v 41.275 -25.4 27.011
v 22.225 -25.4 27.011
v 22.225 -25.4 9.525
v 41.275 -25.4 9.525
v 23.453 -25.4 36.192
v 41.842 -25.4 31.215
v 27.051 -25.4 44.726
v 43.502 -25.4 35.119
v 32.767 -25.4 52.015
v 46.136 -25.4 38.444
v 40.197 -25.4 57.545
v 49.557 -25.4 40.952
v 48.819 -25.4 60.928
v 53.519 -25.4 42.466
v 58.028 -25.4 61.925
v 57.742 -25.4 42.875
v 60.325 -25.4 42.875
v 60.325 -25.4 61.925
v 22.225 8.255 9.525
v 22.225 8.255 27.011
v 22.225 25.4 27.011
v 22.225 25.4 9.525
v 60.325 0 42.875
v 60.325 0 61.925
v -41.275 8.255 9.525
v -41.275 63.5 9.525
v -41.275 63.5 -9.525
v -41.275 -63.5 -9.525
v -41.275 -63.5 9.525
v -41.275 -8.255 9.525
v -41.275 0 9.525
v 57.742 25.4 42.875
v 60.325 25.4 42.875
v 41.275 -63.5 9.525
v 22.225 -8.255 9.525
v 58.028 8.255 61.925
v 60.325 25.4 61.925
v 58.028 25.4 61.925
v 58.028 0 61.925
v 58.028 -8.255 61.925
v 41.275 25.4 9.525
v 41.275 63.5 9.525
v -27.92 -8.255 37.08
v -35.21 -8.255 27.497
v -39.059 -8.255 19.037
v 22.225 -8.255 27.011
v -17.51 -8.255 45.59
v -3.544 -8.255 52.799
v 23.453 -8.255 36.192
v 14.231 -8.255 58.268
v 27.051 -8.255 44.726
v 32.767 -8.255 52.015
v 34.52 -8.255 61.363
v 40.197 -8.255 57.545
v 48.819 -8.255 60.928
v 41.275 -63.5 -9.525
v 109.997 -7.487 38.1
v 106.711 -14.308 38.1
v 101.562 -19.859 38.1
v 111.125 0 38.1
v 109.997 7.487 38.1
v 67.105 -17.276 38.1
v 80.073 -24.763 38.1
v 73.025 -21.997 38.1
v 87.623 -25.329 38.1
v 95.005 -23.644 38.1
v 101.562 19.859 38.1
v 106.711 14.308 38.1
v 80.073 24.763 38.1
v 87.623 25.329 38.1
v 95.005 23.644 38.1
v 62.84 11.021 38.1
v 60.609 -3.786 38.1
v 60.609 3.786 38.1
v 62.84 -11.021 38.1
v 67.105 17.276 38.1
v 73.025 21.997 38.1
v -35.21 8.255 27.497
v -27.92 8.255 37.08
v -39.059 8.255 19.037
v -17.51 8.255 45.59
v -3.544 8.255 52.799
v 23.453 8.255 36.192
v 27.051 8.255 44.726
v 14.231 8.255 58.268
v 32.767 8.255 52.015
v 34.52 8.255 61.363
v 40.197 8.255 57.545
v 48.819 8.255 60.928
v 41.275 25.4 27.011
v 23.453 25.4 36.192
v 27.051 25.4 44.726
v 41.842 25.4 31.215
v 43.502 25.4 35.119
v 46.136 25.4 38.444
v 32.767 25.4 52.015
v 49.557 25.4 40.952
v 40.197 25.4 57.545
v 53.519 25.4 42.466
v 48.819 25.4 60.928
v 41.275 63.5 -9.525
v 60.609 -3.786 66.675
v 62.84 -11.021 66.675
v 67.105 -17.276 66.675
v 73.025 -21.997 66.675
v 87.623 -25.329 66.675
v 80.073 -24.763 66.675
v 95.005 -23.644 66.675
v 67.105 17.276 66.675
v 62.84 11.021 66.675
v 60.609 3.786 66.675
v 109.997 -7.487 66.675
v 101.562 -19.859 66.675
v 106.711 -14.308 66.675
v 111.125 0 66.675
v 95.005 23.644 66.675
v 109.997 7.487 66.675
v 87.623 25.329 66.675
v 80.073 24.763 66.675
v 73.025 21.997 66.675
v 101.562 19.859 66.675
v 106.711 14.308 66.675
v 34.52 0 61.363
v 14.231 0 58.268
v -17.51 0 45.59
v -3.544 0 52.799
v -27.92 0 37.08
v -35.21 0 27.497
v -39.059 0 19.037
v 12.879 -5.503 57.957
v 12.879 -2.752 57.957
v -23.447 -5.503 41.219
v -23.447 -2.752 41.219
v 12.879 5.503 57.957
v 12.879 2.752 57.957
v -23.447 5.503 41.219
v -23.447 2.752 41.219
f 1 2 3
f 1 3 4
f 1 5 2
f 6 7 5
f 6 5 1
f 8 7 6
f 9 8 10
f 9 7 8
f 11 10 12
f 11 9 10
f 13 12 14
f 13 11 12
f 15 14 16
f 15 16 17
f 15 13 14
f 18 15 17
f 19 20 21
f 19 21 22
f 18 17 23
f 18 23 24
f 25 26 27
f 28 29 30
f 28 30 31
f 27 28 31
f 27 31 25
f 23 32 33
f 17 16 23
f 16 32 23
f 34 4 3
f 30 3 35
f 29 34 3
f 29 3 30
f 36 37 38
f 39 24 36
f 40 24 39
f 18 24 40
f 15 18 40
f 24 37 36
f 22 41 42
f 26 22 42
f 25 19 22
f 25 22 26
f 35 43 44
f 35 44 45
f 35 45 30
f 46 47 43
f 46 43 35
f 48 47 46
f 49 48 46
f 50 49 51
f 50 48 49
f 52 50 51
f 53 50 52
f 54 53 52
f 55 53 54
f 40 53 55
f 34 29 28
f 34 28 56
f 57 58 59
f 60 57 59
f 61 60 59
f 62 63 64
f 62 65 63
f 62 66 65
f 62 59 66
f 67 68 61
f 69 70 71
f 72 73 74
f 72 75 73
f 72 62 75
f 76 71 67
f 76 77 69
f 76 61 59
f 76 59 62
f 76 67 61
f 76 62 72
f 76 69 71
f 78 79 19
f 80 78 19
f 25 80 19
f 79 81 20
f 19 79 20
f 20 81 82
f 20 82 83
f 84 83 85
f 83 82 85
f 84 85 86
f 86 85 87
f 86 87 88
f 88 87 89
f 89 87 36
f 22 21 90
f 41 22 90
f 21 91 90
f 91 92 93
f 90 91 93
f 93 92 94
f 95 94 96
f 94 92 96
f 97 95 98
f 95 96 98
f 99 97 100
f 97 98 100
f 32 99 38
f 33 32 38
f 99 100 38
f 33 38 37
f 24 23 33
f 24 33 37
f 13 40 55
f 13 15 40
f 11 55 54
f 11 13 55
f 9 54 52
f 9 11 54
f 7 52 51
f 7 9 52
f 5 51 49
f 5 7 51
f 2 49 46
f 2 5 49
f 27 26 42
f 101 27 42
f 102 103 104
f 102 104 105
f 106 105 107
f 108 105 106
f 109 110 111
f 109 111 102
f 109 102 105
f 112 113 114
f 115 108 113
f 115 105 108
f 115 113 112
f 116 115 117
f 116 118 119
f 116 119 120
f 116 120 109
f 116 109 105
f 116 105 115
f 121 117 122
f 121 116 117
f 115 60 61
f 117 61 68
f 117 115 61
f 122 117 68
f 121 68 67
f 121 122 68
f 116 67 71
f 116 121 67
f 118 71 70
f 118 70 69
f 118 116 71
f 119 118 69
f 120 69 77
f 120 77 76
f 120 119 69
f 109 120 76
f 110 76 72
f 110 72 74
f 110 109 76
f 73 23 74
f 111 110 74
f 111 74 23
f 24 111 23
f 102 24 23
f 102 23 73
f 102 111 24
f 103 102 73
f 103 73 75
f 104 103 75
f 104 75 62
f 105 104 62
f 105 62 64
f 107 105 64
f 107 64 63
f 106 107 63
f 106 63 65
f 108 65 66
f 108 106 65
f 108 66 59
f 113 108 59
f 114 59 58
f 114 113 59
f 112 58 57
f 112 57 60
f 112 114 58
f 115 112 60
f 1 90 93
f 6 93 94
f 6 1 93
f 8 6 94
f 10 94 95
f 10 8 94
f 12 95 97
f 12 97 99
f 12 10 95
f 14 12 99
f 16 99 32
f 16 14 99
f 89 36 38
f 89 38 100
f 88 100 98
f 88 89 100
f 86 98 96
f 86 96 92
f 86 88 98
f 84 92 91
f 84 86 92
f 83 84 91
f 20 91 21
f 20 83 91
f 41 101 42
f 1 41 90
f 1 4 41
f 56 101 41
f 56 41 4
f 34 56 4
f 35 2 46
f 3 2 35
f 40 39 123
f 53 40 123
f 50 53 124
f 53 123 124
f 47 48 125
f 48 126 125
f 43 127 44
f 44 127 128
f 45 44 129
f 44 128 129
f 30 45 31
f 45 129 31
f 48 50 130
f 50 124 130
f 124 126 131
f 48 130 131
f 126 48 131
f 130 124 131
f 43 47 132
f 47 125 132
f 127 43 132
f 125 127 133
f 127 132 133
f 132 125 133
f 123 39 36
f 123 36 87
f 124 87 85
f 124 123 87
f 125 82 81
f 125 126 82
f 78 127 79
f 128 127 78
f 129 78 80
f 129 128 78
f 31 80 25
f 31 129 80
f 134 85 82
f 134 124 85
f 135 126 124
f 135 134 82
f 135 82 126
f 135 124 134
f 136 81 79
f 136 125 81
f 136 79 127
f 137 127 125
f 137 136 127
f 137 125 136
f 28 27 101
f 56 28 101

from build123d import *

# Parameters (mm, degrees)
F1_DEPTH = 63.5
F2_DEPTH = 25.4
F3_DEPTH = 8.255


with BuildPart() as f1:
    # F0 (on Front) → F1 (new body, symmetric)
    with BuildSketch(Plane.XZ):
        Polygon((22.225, 9.525), (-41.275, 9.525), (-41.275, -9.525), (41.275, -9.525), (41.275, 9.525), align=None)
    extrude(amount=F1_DEPTH, both=True)

    # F0 (on Front) → F2 (join, symmetric)
    with BuildSketch(Plane.XZ):
        with BuildLine():
            Line((22.225, 27.011227), (22.225, 9.525))
            Line((22.225, 9.525), (41.275, 9.525))
            Line((41.275, 9.525), (41.275, 27.011227))
            ThreePointArc((41.275, 27.011227), (46.135827, 38.443795), (57.741597, 42.8752))
            Line((57.741597, 42.8752), (60.325, 42.8752))
            Line((60.325, 42.8752), (60.325, 61.9252))
            Line((60.325, 61.9252), (58.027563, 61.9252))
            ThreePointArc((58.027563, 61.9252), (32.766535, 52.015272), (22.225, 27.011227))
        make_face()
    extrude(amount=F2_DEPTH, both=True)

    # F0 (on Front) → F3 (join, symmetric)
    with BuildSketch(Plane.XZ):
        with BuildLine():
            add(Edge.make_bspline(
                [(58.027563, 61.9252), (11.694669, 63.61267), (-35.922706, 49.426701), (-41.275, 9.525)],
                knots=[0, 0, 0, 0, 112.279918, 112.279918, 112.279918, 112.279918], degree=3))
            Line((-41.275, 9.525), (22.225, 9.525))
            Line((22.225, 9.525), (22.225, 27.011227))
            ThreePointArc((22.225, 27.011227), (32.766535, 52.015272), (58.027563, 61.9252))
        make_face()
    extrude(amount=F3_DEPTH, both=True)

    # F0 (on Front) → F4 (revolve)
    with BuildSketch(Plane.XZ):
        Polygon((85.725, 66.675), (85.725, 61.9252), (85.725, 42.8752), (85.725, 38.1), (111.125, 38.1), (111.125, 66.675), align=None)
    revolve(axis=Axis((85.725, 0, 52.3875), (0, 0, 1)))


solid = f1.part
